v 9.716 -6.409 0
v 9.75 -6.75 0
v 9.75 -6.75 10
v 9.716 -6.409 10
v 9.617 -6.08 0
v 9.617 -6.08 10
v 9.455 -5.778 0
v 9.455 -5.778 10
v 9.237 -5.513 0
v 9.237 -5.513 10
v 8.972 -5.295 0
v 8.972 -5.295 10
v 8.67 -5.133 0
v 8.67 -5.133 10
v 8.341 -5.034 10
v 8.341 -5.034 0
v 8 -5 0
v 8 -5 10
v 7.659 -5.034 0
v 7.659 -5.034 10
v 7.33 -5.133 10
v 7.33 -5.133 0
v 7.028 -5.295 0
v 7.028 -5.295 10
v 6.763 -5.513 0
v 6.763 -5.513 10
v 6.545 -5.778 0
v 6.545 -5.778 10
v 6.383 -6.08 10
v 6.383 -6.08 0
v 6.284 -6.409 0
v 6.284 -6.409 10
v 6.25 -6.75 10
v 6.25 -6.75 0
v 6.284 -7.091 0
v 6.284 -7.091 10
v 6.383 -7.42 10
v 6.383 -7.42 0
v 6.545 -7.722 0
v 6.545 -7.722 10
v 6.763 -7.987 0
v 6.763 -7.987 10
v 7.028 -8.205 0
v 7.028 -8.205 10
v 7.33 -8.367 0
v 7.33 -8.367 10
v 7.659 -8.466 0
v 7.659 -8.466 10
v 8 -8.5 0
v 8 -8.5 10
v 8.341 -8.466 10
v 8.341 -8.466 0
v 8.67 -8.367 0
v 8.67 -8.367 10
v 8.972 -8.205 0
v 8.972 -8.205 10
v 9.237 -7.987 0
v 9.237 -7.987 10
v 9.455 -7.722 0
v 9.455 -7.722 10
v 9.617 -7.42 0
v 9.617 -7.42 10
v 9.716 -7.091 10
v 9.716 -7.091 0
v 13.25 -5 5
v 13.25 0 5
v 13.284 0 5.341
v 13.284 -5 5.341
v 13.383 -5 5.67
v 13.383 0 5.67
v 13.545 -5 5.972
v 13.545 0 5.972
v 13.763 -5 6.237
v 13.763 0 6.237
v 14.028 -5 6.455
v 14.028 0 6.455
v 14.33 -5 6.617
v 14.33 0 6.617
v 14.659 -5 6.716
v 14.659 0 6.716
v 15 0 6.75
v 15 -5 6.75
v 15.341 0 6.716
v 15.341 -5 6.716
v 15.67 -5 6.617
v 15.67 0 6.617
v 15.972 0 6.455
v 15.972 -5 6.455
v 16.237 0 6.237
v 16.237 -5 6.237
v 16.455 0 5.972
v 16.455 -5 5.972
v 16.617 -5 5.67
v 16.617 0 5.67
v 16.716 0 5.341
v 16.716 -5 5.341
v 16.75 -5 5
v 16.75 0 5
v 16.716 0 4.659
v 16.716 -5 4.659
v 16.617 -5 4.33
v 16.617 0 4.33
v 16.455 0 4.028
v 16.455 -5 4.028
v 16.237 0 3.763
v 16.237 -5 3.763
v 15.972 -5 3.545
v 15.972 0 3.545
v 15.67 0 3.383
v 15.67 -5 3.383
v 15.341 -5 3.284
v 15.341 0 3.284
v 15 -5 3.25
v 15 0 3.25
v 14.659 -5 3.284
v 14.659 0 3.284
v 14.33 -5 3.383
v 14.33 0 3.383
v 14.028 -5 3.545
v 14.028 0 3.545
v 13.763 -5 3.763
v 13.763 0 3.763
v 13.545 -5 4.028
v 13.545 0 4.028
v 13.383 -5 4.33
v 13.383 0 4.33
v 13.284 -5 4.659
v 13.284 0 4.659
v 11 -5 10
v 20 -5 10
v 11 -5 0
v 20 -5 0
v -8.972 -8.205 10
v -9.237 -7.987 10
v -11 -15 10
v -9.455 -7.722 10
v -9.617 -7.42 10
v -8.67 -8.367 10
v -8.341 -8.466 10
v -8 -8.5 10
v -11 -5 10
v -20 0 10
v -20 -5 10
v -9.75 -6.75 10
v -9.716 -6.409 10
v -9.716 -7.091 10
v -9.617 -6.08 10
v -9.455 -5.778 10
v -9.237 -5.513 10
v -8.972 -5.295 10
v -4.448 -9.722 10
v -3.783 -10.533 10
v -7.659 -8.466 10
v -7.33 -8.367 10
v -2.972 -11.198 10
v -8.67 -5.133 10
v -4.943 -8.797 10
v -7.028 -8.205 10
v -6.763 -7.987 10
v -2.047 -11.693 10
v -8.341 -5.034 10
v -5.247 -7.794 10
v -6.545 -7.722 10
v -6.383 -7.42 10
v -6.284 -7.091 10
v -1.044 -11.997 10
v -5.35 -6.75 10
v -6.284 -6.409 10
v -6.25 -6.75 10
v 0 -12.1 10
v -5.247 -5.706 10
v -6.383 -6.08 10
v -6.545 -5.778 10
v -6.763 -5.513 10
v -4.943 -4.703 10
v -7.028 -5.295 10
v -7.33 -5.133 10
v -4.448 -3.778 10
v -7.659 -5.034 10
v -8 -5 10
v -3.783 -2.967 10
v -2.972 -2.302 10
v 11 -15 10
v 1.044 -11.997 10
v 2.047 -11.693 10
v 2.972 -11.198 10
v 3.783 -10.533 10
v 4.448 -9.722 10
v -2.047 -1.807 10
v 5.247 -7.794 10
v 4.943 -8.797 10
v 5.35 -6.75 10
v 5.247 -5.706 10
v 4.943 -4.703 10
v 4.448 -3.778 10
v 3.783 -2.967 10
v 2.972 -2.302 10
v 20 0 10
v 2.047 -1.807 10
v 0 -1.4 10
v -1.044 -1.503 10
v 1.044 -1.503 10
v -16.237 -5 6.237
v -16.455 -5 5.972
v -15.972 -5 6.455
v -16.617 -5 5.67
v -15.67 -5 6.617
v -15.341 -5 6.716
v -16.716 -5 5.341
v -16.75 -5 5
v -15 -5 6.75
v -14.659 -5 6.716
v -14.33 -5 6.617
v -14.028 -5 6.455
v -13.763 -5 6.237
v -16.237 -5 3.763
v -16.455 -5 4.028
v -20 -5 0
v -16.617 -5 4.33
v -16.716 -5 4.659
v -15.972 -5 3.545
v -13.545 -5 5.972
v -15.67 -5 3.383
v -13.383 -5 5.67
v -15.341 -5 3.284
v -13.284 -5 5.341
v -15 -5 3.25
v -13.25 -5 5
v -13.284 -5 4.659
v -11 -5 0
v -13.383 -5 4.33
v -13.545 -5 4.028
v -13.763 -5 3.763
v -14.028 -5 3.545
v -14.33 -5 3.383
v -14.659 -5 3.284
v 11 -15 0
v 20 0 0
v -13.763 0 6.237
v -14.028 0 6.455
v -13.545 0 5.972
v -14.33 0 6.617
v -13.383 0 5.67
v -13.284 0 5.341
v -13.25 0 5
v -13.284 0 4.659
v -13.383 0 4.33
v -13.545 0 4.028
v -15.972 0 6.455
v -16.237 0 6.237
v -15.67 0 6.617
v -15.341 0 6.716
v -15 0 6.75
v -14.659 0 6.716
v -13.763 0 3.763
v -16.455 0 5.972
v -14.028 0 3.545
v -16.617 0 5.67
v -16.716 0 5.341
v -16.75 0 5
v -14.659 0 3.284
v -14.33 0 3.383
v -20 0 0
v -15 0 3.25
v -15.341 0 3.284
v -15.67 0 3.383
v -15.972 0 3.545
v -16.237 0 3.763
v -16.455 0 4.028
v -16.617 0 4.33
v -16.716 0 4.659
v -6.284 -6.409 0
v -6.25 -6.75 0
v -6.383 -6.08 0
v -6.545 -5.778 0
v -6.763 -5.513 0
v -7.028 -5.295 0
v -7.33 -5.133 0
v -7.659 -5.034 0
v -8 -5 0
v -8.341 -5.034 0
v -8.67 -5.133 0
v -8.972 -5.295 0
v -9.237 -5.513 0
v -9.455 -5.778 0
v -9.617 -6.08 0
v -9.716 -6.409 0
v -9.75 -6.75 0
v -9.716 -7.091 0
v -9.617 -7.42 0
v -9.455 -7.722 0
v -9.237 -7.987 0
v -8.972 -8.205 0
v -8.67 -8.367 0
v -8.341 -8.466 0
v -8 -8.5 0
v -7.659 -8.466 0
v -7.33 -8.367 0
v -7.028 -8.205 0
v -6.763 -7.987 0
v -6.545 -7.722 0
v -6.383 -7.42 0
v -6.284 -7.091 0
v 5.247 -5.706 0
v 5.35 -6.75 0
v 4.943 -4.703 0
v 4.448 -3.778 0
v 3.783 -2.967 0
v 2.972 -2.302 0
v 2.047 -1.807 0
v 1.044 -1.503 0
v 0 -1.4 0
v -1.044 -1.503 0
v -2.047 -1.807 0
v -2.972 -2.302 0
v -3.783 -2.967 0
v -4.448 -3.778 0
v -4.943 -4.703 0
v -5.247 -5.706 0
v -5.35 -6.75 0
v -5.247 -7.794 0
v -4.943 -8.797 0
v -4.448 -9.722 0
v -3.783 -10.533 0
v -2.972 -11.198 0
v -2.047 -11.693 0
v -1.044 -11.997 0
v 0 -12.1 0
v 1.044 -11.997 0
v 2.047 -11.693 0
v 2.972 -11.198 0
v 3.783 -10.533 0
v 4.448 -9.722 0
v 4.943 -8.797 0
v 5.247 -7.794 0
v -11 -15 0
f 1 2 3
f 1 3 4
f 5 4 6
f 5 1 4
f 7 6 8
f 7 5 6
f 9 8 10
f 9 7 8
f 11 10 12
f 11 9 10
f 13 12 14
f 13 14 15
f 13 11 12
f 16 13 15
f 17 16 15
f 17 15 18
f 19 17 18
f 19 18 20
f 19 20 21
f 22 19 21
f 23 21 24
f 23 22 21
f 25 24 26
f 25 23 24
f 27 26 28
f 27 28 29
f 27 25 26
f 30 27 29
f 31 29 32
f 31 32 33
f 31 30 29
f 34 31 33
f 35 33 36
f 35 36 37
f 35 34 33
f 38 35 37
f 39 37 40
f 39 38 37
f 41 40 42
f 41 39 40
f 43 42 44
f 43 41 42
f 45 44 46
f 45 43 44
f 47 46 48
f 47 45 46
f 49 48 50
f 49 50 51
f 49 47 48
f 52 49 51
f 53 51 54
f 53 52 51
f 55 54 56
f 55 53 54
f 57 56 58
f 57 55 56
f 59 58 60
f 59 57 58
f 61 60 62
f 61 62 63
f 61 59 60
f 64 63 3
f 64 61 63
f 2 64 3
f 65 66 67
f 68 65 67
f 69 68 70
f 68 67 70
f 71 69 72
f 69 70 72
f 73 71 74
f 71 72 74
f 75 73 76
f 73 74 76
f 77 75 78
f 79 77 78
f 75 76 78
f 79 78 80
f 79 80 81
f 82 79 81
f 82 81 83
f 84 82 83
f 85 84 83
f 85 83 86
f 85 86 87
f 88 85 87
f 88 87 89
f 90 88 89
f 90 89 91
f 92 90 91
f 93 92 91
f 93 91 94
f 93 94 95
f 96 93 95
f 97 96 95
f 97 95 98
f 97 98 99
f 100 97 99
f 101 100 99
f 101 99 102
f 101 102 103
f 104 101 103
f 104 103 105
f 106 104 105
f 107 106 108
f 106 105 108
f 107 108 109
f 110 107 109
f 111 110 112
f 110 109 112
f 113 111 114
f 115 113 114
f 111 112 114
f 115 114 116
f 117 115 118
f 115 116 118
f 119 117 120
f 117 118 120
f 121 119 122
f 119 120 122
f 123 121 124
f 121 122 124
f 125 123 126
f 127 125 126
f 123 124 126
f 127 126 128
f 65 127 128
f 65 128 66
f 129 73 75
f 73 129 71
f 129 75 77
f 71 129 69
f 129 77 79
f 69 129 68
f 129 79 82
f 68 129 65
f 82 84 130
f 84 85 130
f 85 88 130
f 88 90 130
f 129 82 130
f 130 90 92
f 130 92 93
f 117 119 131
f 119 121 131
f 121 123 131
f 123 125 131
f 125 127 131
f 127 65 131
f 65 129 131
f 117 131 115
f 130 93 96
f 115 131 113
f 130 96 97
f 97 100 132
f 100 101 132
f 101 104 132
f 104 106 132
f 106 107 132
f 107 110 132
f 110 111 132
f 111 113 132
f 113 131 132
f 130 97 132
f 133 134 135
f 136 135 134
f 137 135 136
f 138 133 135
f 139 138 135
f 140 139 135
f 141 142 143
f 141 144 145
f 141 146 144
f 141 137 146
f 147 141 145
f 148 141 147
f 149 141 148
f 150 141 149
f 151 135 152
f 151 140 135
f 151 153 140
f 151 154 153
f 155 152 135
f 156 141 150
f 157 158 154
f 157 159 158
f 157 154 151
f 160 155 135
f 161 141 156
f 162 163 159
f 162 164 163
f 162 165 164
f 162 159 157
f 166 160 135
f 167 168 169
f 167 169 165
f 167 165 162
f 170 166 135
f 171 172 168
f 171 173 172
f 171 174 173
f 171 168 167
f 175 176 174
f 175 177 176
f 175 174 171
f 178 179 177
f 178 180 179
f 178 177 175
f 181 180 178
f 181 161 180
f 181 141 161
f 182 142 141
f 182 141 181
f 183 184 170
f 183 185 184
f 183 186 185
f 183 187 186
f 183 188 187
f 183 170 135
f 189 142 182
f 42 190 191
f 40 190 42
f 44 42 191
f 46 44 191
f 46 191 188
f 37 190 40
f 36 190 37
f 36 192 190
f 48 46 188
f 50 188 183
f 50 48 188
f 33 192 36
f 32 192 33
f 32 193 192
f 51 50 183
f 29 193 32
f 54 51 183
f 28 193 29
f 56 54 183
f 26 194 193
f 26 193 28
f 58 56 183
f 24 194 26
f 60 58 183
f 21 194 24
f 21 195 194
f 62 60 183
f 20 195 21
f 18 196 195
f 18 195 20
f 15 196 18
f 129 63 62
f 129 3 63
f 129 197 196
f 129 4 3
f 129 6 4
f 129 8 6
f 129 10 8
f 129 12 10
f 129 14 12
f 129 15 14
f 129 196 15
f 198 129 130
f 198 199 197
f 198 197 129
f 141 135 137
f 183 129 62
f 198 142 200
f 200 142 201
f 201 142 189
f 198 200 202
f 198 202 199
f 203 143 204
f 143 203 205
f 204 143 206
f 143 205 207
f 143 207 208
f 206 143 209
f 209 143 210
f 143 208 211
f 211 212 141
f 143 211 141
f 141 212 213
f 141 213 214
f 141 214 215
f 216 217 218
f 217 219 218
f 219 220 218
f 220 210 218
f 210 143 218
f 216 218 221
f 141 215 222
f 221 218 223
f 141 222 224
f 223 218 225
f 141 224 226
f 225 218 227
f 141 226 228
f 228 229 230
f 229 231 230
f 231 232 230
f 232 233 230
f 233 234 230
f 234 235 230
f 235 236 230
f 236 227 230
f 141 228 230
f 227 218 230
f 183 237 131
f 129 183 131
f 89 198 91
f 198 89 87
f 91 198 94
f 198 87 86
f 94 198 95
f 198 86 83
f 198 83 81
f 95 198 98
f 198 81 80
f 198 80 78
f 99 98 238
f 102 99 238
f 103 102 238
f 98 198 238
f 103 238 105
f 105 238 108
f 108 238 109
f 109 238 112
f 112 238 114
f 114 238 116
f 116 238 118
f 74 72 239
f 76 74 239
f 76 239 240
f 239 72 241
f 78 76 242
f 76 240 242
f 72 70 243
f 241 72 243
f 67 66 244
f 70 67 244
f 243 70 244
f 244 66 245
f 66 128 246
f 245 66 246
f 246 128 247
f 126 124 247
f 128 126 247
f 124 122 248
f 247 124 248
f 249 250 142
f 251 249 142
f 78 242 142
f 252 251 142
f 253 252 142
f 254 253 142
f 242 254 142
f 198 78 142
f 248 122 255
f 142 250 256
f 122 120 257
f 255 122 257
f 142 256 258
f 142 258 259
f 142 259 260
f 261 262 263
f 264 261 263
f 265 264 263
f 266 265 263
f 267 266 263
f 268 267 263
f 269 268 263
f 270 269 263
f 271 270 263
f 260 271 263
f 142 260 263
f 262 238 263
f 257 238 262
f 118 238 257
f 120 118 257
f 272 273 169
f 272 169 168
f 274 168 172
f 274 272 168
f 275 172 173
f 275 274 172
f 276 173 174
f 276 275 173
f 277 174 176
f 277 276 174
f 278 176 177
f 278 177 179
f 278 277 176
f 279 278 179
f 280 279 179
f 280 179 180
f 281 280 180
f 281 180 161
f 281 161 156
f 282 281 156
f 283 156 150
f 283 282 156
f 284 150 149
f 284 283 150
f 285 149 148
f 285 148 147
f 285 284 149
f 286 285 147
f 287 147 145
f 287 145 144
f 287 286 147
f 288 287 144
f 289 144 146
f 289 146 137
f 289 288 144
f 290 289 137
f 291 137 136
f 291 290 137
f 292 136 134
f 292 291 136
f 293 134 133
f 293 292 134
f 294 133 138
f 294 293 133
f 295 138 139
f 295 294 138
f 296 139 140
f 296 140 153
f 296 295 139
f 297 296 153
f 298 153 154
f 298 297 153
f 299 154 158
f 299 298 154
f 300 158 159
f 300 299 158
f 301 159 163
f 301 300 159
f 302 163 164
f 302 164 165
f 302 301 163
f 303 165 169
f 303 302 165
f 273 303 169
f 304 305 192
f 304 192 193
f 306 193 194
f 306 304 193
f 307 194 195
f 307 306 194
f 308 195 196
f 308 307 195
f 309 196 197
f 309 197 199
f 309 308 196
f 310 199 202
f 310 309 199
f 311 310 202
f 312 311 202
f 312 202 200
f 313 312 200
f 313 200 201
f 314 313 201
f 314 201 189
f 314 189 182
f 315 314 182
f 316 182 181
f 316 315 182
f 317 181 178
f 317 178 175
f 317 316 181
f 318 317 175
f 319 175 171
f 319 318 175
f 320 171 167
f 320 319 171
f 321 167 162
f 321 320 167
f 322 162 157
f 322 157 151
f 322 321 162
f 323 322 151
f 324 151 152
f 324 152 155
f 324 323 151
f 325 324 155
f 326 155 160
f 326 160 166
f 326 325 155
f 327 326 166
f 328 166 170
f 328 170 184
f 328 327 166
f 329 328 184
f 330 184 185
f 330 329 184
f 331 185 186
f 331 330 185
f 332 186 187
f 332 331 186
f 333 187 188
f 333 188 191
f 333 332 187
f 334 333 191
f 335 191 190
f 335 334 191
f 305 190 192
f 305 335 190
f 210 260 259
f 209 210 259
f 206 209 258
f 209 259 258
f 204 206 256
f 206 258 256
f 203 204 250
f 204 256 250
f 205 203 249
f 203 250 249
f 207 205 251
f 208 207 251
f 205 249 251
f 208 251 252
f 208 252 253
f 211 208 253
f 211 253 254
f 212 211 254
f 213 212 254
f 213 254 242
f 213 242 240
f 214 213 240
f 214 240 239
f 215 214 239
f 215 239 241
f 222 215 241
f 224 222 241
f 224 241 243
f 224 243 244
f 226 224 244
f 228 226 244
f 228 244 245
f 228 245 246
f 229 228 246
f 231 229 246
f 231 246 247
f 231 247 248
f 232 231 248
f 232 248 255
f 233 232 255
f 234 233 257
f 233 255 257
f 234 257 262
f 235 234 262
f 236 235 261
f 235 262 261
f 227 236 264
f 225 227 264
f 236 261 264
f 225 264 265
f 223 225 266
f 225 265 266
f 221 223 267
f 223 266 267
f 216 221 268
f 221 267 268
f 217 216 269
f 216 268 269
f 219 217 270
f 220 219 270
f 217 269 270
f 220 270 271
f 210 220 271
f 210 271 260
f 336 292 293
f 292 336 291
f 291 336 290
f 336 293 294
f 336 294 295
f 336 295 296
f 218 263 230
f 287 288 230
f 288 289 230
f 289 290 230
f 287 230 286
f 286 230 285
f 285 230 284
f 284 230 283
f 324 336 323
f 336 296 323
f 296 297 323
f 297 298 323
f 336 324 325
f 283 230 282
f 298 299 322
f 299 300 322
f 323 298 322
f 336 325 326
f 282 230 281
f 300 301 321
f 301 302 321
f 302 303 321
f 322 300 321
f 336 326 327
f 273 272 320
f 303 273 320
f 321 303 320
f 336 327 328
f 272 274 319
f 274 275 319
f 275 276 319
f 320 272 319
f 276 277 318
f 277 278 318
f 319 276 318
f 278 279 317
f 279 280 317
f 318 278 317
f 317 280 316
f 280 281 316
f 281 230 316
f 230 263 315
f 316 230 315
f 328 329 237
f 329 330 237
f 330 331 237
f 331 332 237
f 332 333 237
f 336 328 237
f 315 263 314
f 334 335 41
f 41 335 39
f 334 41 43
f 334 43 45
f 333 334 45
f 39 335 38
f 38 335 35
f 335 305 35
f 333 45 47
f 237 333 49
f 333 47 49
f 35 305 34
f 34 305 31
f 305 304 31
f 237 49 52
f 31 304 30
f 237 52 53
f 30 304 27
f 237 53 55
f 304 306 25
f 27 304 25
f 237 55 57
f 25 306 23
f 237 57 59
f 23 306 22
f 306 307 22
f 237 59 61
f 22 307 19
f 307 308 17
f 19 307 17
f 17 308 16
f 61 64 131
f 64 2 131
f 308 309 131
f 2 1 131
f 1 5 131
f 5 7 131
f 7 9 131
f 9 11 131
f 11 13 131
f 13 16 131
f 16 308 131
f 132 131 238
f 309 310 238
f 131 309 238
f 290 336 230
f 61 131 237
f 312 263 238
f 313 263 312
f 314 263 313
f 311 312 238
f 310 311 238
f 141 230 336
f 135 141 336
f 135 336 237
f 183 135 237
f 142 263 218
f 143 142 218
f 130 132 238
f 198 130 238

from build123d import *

# Parameters (mm, degrees)
ESBO_O1_R                = 5.35
ESBO_O1_R_2              = 1.75
RESSALTO_EXTRUS_O1_DEPTH = 10
ESBO_O2_R                = 1.75
CORTE_EXTRUS_O1_DEPTH    = 10


with BuildPart() as part:
    # Esboço1 → Ressalto-extrusão1 (new body)
    with BuildSketch(Plane.XY):
        Polygon((-11, -5), (-11, -15), (11, -15), (11, -5), (20, -5), (20, 0), (-20, 0), (-20, -5), align=None)
        with Locations((0, -6.75)):
            Circle(ESBO_O1_R, mode=Mode.SUBTRACT)
        with Locations((-8, -6.75)):
            Circle(ESBO_O1_R_2, mode=Mode.SUBTRACT)
        with Locations((8, -6.75)):
            Circle(ESBO_O1_R_2, mode=Mode.SUBTRACT)
    extrude(amount=RESSALTO_EXTRUS_O1_DEPTH)

    # Esboço2 → Corte-extrusão1 (cut)
    with BuildSketch(Plane(origin=(0, 0, 0), x_dir=(1, 0, 0), z_dir=(0, 1, 0))):
        with Locations(Location((-15, -5, 0), (0, 0, 180))):
            Circle(ESBO_O2_R)
        with Locations(Location((15, -5, 0), (0, 0, 180))):
            Circle(ESBO_O2_R)
    extrude(amount=-CORTE_EXTRUS_O1_DEPTH, mode=Mode.SUBTRACT)


solid = part.part
